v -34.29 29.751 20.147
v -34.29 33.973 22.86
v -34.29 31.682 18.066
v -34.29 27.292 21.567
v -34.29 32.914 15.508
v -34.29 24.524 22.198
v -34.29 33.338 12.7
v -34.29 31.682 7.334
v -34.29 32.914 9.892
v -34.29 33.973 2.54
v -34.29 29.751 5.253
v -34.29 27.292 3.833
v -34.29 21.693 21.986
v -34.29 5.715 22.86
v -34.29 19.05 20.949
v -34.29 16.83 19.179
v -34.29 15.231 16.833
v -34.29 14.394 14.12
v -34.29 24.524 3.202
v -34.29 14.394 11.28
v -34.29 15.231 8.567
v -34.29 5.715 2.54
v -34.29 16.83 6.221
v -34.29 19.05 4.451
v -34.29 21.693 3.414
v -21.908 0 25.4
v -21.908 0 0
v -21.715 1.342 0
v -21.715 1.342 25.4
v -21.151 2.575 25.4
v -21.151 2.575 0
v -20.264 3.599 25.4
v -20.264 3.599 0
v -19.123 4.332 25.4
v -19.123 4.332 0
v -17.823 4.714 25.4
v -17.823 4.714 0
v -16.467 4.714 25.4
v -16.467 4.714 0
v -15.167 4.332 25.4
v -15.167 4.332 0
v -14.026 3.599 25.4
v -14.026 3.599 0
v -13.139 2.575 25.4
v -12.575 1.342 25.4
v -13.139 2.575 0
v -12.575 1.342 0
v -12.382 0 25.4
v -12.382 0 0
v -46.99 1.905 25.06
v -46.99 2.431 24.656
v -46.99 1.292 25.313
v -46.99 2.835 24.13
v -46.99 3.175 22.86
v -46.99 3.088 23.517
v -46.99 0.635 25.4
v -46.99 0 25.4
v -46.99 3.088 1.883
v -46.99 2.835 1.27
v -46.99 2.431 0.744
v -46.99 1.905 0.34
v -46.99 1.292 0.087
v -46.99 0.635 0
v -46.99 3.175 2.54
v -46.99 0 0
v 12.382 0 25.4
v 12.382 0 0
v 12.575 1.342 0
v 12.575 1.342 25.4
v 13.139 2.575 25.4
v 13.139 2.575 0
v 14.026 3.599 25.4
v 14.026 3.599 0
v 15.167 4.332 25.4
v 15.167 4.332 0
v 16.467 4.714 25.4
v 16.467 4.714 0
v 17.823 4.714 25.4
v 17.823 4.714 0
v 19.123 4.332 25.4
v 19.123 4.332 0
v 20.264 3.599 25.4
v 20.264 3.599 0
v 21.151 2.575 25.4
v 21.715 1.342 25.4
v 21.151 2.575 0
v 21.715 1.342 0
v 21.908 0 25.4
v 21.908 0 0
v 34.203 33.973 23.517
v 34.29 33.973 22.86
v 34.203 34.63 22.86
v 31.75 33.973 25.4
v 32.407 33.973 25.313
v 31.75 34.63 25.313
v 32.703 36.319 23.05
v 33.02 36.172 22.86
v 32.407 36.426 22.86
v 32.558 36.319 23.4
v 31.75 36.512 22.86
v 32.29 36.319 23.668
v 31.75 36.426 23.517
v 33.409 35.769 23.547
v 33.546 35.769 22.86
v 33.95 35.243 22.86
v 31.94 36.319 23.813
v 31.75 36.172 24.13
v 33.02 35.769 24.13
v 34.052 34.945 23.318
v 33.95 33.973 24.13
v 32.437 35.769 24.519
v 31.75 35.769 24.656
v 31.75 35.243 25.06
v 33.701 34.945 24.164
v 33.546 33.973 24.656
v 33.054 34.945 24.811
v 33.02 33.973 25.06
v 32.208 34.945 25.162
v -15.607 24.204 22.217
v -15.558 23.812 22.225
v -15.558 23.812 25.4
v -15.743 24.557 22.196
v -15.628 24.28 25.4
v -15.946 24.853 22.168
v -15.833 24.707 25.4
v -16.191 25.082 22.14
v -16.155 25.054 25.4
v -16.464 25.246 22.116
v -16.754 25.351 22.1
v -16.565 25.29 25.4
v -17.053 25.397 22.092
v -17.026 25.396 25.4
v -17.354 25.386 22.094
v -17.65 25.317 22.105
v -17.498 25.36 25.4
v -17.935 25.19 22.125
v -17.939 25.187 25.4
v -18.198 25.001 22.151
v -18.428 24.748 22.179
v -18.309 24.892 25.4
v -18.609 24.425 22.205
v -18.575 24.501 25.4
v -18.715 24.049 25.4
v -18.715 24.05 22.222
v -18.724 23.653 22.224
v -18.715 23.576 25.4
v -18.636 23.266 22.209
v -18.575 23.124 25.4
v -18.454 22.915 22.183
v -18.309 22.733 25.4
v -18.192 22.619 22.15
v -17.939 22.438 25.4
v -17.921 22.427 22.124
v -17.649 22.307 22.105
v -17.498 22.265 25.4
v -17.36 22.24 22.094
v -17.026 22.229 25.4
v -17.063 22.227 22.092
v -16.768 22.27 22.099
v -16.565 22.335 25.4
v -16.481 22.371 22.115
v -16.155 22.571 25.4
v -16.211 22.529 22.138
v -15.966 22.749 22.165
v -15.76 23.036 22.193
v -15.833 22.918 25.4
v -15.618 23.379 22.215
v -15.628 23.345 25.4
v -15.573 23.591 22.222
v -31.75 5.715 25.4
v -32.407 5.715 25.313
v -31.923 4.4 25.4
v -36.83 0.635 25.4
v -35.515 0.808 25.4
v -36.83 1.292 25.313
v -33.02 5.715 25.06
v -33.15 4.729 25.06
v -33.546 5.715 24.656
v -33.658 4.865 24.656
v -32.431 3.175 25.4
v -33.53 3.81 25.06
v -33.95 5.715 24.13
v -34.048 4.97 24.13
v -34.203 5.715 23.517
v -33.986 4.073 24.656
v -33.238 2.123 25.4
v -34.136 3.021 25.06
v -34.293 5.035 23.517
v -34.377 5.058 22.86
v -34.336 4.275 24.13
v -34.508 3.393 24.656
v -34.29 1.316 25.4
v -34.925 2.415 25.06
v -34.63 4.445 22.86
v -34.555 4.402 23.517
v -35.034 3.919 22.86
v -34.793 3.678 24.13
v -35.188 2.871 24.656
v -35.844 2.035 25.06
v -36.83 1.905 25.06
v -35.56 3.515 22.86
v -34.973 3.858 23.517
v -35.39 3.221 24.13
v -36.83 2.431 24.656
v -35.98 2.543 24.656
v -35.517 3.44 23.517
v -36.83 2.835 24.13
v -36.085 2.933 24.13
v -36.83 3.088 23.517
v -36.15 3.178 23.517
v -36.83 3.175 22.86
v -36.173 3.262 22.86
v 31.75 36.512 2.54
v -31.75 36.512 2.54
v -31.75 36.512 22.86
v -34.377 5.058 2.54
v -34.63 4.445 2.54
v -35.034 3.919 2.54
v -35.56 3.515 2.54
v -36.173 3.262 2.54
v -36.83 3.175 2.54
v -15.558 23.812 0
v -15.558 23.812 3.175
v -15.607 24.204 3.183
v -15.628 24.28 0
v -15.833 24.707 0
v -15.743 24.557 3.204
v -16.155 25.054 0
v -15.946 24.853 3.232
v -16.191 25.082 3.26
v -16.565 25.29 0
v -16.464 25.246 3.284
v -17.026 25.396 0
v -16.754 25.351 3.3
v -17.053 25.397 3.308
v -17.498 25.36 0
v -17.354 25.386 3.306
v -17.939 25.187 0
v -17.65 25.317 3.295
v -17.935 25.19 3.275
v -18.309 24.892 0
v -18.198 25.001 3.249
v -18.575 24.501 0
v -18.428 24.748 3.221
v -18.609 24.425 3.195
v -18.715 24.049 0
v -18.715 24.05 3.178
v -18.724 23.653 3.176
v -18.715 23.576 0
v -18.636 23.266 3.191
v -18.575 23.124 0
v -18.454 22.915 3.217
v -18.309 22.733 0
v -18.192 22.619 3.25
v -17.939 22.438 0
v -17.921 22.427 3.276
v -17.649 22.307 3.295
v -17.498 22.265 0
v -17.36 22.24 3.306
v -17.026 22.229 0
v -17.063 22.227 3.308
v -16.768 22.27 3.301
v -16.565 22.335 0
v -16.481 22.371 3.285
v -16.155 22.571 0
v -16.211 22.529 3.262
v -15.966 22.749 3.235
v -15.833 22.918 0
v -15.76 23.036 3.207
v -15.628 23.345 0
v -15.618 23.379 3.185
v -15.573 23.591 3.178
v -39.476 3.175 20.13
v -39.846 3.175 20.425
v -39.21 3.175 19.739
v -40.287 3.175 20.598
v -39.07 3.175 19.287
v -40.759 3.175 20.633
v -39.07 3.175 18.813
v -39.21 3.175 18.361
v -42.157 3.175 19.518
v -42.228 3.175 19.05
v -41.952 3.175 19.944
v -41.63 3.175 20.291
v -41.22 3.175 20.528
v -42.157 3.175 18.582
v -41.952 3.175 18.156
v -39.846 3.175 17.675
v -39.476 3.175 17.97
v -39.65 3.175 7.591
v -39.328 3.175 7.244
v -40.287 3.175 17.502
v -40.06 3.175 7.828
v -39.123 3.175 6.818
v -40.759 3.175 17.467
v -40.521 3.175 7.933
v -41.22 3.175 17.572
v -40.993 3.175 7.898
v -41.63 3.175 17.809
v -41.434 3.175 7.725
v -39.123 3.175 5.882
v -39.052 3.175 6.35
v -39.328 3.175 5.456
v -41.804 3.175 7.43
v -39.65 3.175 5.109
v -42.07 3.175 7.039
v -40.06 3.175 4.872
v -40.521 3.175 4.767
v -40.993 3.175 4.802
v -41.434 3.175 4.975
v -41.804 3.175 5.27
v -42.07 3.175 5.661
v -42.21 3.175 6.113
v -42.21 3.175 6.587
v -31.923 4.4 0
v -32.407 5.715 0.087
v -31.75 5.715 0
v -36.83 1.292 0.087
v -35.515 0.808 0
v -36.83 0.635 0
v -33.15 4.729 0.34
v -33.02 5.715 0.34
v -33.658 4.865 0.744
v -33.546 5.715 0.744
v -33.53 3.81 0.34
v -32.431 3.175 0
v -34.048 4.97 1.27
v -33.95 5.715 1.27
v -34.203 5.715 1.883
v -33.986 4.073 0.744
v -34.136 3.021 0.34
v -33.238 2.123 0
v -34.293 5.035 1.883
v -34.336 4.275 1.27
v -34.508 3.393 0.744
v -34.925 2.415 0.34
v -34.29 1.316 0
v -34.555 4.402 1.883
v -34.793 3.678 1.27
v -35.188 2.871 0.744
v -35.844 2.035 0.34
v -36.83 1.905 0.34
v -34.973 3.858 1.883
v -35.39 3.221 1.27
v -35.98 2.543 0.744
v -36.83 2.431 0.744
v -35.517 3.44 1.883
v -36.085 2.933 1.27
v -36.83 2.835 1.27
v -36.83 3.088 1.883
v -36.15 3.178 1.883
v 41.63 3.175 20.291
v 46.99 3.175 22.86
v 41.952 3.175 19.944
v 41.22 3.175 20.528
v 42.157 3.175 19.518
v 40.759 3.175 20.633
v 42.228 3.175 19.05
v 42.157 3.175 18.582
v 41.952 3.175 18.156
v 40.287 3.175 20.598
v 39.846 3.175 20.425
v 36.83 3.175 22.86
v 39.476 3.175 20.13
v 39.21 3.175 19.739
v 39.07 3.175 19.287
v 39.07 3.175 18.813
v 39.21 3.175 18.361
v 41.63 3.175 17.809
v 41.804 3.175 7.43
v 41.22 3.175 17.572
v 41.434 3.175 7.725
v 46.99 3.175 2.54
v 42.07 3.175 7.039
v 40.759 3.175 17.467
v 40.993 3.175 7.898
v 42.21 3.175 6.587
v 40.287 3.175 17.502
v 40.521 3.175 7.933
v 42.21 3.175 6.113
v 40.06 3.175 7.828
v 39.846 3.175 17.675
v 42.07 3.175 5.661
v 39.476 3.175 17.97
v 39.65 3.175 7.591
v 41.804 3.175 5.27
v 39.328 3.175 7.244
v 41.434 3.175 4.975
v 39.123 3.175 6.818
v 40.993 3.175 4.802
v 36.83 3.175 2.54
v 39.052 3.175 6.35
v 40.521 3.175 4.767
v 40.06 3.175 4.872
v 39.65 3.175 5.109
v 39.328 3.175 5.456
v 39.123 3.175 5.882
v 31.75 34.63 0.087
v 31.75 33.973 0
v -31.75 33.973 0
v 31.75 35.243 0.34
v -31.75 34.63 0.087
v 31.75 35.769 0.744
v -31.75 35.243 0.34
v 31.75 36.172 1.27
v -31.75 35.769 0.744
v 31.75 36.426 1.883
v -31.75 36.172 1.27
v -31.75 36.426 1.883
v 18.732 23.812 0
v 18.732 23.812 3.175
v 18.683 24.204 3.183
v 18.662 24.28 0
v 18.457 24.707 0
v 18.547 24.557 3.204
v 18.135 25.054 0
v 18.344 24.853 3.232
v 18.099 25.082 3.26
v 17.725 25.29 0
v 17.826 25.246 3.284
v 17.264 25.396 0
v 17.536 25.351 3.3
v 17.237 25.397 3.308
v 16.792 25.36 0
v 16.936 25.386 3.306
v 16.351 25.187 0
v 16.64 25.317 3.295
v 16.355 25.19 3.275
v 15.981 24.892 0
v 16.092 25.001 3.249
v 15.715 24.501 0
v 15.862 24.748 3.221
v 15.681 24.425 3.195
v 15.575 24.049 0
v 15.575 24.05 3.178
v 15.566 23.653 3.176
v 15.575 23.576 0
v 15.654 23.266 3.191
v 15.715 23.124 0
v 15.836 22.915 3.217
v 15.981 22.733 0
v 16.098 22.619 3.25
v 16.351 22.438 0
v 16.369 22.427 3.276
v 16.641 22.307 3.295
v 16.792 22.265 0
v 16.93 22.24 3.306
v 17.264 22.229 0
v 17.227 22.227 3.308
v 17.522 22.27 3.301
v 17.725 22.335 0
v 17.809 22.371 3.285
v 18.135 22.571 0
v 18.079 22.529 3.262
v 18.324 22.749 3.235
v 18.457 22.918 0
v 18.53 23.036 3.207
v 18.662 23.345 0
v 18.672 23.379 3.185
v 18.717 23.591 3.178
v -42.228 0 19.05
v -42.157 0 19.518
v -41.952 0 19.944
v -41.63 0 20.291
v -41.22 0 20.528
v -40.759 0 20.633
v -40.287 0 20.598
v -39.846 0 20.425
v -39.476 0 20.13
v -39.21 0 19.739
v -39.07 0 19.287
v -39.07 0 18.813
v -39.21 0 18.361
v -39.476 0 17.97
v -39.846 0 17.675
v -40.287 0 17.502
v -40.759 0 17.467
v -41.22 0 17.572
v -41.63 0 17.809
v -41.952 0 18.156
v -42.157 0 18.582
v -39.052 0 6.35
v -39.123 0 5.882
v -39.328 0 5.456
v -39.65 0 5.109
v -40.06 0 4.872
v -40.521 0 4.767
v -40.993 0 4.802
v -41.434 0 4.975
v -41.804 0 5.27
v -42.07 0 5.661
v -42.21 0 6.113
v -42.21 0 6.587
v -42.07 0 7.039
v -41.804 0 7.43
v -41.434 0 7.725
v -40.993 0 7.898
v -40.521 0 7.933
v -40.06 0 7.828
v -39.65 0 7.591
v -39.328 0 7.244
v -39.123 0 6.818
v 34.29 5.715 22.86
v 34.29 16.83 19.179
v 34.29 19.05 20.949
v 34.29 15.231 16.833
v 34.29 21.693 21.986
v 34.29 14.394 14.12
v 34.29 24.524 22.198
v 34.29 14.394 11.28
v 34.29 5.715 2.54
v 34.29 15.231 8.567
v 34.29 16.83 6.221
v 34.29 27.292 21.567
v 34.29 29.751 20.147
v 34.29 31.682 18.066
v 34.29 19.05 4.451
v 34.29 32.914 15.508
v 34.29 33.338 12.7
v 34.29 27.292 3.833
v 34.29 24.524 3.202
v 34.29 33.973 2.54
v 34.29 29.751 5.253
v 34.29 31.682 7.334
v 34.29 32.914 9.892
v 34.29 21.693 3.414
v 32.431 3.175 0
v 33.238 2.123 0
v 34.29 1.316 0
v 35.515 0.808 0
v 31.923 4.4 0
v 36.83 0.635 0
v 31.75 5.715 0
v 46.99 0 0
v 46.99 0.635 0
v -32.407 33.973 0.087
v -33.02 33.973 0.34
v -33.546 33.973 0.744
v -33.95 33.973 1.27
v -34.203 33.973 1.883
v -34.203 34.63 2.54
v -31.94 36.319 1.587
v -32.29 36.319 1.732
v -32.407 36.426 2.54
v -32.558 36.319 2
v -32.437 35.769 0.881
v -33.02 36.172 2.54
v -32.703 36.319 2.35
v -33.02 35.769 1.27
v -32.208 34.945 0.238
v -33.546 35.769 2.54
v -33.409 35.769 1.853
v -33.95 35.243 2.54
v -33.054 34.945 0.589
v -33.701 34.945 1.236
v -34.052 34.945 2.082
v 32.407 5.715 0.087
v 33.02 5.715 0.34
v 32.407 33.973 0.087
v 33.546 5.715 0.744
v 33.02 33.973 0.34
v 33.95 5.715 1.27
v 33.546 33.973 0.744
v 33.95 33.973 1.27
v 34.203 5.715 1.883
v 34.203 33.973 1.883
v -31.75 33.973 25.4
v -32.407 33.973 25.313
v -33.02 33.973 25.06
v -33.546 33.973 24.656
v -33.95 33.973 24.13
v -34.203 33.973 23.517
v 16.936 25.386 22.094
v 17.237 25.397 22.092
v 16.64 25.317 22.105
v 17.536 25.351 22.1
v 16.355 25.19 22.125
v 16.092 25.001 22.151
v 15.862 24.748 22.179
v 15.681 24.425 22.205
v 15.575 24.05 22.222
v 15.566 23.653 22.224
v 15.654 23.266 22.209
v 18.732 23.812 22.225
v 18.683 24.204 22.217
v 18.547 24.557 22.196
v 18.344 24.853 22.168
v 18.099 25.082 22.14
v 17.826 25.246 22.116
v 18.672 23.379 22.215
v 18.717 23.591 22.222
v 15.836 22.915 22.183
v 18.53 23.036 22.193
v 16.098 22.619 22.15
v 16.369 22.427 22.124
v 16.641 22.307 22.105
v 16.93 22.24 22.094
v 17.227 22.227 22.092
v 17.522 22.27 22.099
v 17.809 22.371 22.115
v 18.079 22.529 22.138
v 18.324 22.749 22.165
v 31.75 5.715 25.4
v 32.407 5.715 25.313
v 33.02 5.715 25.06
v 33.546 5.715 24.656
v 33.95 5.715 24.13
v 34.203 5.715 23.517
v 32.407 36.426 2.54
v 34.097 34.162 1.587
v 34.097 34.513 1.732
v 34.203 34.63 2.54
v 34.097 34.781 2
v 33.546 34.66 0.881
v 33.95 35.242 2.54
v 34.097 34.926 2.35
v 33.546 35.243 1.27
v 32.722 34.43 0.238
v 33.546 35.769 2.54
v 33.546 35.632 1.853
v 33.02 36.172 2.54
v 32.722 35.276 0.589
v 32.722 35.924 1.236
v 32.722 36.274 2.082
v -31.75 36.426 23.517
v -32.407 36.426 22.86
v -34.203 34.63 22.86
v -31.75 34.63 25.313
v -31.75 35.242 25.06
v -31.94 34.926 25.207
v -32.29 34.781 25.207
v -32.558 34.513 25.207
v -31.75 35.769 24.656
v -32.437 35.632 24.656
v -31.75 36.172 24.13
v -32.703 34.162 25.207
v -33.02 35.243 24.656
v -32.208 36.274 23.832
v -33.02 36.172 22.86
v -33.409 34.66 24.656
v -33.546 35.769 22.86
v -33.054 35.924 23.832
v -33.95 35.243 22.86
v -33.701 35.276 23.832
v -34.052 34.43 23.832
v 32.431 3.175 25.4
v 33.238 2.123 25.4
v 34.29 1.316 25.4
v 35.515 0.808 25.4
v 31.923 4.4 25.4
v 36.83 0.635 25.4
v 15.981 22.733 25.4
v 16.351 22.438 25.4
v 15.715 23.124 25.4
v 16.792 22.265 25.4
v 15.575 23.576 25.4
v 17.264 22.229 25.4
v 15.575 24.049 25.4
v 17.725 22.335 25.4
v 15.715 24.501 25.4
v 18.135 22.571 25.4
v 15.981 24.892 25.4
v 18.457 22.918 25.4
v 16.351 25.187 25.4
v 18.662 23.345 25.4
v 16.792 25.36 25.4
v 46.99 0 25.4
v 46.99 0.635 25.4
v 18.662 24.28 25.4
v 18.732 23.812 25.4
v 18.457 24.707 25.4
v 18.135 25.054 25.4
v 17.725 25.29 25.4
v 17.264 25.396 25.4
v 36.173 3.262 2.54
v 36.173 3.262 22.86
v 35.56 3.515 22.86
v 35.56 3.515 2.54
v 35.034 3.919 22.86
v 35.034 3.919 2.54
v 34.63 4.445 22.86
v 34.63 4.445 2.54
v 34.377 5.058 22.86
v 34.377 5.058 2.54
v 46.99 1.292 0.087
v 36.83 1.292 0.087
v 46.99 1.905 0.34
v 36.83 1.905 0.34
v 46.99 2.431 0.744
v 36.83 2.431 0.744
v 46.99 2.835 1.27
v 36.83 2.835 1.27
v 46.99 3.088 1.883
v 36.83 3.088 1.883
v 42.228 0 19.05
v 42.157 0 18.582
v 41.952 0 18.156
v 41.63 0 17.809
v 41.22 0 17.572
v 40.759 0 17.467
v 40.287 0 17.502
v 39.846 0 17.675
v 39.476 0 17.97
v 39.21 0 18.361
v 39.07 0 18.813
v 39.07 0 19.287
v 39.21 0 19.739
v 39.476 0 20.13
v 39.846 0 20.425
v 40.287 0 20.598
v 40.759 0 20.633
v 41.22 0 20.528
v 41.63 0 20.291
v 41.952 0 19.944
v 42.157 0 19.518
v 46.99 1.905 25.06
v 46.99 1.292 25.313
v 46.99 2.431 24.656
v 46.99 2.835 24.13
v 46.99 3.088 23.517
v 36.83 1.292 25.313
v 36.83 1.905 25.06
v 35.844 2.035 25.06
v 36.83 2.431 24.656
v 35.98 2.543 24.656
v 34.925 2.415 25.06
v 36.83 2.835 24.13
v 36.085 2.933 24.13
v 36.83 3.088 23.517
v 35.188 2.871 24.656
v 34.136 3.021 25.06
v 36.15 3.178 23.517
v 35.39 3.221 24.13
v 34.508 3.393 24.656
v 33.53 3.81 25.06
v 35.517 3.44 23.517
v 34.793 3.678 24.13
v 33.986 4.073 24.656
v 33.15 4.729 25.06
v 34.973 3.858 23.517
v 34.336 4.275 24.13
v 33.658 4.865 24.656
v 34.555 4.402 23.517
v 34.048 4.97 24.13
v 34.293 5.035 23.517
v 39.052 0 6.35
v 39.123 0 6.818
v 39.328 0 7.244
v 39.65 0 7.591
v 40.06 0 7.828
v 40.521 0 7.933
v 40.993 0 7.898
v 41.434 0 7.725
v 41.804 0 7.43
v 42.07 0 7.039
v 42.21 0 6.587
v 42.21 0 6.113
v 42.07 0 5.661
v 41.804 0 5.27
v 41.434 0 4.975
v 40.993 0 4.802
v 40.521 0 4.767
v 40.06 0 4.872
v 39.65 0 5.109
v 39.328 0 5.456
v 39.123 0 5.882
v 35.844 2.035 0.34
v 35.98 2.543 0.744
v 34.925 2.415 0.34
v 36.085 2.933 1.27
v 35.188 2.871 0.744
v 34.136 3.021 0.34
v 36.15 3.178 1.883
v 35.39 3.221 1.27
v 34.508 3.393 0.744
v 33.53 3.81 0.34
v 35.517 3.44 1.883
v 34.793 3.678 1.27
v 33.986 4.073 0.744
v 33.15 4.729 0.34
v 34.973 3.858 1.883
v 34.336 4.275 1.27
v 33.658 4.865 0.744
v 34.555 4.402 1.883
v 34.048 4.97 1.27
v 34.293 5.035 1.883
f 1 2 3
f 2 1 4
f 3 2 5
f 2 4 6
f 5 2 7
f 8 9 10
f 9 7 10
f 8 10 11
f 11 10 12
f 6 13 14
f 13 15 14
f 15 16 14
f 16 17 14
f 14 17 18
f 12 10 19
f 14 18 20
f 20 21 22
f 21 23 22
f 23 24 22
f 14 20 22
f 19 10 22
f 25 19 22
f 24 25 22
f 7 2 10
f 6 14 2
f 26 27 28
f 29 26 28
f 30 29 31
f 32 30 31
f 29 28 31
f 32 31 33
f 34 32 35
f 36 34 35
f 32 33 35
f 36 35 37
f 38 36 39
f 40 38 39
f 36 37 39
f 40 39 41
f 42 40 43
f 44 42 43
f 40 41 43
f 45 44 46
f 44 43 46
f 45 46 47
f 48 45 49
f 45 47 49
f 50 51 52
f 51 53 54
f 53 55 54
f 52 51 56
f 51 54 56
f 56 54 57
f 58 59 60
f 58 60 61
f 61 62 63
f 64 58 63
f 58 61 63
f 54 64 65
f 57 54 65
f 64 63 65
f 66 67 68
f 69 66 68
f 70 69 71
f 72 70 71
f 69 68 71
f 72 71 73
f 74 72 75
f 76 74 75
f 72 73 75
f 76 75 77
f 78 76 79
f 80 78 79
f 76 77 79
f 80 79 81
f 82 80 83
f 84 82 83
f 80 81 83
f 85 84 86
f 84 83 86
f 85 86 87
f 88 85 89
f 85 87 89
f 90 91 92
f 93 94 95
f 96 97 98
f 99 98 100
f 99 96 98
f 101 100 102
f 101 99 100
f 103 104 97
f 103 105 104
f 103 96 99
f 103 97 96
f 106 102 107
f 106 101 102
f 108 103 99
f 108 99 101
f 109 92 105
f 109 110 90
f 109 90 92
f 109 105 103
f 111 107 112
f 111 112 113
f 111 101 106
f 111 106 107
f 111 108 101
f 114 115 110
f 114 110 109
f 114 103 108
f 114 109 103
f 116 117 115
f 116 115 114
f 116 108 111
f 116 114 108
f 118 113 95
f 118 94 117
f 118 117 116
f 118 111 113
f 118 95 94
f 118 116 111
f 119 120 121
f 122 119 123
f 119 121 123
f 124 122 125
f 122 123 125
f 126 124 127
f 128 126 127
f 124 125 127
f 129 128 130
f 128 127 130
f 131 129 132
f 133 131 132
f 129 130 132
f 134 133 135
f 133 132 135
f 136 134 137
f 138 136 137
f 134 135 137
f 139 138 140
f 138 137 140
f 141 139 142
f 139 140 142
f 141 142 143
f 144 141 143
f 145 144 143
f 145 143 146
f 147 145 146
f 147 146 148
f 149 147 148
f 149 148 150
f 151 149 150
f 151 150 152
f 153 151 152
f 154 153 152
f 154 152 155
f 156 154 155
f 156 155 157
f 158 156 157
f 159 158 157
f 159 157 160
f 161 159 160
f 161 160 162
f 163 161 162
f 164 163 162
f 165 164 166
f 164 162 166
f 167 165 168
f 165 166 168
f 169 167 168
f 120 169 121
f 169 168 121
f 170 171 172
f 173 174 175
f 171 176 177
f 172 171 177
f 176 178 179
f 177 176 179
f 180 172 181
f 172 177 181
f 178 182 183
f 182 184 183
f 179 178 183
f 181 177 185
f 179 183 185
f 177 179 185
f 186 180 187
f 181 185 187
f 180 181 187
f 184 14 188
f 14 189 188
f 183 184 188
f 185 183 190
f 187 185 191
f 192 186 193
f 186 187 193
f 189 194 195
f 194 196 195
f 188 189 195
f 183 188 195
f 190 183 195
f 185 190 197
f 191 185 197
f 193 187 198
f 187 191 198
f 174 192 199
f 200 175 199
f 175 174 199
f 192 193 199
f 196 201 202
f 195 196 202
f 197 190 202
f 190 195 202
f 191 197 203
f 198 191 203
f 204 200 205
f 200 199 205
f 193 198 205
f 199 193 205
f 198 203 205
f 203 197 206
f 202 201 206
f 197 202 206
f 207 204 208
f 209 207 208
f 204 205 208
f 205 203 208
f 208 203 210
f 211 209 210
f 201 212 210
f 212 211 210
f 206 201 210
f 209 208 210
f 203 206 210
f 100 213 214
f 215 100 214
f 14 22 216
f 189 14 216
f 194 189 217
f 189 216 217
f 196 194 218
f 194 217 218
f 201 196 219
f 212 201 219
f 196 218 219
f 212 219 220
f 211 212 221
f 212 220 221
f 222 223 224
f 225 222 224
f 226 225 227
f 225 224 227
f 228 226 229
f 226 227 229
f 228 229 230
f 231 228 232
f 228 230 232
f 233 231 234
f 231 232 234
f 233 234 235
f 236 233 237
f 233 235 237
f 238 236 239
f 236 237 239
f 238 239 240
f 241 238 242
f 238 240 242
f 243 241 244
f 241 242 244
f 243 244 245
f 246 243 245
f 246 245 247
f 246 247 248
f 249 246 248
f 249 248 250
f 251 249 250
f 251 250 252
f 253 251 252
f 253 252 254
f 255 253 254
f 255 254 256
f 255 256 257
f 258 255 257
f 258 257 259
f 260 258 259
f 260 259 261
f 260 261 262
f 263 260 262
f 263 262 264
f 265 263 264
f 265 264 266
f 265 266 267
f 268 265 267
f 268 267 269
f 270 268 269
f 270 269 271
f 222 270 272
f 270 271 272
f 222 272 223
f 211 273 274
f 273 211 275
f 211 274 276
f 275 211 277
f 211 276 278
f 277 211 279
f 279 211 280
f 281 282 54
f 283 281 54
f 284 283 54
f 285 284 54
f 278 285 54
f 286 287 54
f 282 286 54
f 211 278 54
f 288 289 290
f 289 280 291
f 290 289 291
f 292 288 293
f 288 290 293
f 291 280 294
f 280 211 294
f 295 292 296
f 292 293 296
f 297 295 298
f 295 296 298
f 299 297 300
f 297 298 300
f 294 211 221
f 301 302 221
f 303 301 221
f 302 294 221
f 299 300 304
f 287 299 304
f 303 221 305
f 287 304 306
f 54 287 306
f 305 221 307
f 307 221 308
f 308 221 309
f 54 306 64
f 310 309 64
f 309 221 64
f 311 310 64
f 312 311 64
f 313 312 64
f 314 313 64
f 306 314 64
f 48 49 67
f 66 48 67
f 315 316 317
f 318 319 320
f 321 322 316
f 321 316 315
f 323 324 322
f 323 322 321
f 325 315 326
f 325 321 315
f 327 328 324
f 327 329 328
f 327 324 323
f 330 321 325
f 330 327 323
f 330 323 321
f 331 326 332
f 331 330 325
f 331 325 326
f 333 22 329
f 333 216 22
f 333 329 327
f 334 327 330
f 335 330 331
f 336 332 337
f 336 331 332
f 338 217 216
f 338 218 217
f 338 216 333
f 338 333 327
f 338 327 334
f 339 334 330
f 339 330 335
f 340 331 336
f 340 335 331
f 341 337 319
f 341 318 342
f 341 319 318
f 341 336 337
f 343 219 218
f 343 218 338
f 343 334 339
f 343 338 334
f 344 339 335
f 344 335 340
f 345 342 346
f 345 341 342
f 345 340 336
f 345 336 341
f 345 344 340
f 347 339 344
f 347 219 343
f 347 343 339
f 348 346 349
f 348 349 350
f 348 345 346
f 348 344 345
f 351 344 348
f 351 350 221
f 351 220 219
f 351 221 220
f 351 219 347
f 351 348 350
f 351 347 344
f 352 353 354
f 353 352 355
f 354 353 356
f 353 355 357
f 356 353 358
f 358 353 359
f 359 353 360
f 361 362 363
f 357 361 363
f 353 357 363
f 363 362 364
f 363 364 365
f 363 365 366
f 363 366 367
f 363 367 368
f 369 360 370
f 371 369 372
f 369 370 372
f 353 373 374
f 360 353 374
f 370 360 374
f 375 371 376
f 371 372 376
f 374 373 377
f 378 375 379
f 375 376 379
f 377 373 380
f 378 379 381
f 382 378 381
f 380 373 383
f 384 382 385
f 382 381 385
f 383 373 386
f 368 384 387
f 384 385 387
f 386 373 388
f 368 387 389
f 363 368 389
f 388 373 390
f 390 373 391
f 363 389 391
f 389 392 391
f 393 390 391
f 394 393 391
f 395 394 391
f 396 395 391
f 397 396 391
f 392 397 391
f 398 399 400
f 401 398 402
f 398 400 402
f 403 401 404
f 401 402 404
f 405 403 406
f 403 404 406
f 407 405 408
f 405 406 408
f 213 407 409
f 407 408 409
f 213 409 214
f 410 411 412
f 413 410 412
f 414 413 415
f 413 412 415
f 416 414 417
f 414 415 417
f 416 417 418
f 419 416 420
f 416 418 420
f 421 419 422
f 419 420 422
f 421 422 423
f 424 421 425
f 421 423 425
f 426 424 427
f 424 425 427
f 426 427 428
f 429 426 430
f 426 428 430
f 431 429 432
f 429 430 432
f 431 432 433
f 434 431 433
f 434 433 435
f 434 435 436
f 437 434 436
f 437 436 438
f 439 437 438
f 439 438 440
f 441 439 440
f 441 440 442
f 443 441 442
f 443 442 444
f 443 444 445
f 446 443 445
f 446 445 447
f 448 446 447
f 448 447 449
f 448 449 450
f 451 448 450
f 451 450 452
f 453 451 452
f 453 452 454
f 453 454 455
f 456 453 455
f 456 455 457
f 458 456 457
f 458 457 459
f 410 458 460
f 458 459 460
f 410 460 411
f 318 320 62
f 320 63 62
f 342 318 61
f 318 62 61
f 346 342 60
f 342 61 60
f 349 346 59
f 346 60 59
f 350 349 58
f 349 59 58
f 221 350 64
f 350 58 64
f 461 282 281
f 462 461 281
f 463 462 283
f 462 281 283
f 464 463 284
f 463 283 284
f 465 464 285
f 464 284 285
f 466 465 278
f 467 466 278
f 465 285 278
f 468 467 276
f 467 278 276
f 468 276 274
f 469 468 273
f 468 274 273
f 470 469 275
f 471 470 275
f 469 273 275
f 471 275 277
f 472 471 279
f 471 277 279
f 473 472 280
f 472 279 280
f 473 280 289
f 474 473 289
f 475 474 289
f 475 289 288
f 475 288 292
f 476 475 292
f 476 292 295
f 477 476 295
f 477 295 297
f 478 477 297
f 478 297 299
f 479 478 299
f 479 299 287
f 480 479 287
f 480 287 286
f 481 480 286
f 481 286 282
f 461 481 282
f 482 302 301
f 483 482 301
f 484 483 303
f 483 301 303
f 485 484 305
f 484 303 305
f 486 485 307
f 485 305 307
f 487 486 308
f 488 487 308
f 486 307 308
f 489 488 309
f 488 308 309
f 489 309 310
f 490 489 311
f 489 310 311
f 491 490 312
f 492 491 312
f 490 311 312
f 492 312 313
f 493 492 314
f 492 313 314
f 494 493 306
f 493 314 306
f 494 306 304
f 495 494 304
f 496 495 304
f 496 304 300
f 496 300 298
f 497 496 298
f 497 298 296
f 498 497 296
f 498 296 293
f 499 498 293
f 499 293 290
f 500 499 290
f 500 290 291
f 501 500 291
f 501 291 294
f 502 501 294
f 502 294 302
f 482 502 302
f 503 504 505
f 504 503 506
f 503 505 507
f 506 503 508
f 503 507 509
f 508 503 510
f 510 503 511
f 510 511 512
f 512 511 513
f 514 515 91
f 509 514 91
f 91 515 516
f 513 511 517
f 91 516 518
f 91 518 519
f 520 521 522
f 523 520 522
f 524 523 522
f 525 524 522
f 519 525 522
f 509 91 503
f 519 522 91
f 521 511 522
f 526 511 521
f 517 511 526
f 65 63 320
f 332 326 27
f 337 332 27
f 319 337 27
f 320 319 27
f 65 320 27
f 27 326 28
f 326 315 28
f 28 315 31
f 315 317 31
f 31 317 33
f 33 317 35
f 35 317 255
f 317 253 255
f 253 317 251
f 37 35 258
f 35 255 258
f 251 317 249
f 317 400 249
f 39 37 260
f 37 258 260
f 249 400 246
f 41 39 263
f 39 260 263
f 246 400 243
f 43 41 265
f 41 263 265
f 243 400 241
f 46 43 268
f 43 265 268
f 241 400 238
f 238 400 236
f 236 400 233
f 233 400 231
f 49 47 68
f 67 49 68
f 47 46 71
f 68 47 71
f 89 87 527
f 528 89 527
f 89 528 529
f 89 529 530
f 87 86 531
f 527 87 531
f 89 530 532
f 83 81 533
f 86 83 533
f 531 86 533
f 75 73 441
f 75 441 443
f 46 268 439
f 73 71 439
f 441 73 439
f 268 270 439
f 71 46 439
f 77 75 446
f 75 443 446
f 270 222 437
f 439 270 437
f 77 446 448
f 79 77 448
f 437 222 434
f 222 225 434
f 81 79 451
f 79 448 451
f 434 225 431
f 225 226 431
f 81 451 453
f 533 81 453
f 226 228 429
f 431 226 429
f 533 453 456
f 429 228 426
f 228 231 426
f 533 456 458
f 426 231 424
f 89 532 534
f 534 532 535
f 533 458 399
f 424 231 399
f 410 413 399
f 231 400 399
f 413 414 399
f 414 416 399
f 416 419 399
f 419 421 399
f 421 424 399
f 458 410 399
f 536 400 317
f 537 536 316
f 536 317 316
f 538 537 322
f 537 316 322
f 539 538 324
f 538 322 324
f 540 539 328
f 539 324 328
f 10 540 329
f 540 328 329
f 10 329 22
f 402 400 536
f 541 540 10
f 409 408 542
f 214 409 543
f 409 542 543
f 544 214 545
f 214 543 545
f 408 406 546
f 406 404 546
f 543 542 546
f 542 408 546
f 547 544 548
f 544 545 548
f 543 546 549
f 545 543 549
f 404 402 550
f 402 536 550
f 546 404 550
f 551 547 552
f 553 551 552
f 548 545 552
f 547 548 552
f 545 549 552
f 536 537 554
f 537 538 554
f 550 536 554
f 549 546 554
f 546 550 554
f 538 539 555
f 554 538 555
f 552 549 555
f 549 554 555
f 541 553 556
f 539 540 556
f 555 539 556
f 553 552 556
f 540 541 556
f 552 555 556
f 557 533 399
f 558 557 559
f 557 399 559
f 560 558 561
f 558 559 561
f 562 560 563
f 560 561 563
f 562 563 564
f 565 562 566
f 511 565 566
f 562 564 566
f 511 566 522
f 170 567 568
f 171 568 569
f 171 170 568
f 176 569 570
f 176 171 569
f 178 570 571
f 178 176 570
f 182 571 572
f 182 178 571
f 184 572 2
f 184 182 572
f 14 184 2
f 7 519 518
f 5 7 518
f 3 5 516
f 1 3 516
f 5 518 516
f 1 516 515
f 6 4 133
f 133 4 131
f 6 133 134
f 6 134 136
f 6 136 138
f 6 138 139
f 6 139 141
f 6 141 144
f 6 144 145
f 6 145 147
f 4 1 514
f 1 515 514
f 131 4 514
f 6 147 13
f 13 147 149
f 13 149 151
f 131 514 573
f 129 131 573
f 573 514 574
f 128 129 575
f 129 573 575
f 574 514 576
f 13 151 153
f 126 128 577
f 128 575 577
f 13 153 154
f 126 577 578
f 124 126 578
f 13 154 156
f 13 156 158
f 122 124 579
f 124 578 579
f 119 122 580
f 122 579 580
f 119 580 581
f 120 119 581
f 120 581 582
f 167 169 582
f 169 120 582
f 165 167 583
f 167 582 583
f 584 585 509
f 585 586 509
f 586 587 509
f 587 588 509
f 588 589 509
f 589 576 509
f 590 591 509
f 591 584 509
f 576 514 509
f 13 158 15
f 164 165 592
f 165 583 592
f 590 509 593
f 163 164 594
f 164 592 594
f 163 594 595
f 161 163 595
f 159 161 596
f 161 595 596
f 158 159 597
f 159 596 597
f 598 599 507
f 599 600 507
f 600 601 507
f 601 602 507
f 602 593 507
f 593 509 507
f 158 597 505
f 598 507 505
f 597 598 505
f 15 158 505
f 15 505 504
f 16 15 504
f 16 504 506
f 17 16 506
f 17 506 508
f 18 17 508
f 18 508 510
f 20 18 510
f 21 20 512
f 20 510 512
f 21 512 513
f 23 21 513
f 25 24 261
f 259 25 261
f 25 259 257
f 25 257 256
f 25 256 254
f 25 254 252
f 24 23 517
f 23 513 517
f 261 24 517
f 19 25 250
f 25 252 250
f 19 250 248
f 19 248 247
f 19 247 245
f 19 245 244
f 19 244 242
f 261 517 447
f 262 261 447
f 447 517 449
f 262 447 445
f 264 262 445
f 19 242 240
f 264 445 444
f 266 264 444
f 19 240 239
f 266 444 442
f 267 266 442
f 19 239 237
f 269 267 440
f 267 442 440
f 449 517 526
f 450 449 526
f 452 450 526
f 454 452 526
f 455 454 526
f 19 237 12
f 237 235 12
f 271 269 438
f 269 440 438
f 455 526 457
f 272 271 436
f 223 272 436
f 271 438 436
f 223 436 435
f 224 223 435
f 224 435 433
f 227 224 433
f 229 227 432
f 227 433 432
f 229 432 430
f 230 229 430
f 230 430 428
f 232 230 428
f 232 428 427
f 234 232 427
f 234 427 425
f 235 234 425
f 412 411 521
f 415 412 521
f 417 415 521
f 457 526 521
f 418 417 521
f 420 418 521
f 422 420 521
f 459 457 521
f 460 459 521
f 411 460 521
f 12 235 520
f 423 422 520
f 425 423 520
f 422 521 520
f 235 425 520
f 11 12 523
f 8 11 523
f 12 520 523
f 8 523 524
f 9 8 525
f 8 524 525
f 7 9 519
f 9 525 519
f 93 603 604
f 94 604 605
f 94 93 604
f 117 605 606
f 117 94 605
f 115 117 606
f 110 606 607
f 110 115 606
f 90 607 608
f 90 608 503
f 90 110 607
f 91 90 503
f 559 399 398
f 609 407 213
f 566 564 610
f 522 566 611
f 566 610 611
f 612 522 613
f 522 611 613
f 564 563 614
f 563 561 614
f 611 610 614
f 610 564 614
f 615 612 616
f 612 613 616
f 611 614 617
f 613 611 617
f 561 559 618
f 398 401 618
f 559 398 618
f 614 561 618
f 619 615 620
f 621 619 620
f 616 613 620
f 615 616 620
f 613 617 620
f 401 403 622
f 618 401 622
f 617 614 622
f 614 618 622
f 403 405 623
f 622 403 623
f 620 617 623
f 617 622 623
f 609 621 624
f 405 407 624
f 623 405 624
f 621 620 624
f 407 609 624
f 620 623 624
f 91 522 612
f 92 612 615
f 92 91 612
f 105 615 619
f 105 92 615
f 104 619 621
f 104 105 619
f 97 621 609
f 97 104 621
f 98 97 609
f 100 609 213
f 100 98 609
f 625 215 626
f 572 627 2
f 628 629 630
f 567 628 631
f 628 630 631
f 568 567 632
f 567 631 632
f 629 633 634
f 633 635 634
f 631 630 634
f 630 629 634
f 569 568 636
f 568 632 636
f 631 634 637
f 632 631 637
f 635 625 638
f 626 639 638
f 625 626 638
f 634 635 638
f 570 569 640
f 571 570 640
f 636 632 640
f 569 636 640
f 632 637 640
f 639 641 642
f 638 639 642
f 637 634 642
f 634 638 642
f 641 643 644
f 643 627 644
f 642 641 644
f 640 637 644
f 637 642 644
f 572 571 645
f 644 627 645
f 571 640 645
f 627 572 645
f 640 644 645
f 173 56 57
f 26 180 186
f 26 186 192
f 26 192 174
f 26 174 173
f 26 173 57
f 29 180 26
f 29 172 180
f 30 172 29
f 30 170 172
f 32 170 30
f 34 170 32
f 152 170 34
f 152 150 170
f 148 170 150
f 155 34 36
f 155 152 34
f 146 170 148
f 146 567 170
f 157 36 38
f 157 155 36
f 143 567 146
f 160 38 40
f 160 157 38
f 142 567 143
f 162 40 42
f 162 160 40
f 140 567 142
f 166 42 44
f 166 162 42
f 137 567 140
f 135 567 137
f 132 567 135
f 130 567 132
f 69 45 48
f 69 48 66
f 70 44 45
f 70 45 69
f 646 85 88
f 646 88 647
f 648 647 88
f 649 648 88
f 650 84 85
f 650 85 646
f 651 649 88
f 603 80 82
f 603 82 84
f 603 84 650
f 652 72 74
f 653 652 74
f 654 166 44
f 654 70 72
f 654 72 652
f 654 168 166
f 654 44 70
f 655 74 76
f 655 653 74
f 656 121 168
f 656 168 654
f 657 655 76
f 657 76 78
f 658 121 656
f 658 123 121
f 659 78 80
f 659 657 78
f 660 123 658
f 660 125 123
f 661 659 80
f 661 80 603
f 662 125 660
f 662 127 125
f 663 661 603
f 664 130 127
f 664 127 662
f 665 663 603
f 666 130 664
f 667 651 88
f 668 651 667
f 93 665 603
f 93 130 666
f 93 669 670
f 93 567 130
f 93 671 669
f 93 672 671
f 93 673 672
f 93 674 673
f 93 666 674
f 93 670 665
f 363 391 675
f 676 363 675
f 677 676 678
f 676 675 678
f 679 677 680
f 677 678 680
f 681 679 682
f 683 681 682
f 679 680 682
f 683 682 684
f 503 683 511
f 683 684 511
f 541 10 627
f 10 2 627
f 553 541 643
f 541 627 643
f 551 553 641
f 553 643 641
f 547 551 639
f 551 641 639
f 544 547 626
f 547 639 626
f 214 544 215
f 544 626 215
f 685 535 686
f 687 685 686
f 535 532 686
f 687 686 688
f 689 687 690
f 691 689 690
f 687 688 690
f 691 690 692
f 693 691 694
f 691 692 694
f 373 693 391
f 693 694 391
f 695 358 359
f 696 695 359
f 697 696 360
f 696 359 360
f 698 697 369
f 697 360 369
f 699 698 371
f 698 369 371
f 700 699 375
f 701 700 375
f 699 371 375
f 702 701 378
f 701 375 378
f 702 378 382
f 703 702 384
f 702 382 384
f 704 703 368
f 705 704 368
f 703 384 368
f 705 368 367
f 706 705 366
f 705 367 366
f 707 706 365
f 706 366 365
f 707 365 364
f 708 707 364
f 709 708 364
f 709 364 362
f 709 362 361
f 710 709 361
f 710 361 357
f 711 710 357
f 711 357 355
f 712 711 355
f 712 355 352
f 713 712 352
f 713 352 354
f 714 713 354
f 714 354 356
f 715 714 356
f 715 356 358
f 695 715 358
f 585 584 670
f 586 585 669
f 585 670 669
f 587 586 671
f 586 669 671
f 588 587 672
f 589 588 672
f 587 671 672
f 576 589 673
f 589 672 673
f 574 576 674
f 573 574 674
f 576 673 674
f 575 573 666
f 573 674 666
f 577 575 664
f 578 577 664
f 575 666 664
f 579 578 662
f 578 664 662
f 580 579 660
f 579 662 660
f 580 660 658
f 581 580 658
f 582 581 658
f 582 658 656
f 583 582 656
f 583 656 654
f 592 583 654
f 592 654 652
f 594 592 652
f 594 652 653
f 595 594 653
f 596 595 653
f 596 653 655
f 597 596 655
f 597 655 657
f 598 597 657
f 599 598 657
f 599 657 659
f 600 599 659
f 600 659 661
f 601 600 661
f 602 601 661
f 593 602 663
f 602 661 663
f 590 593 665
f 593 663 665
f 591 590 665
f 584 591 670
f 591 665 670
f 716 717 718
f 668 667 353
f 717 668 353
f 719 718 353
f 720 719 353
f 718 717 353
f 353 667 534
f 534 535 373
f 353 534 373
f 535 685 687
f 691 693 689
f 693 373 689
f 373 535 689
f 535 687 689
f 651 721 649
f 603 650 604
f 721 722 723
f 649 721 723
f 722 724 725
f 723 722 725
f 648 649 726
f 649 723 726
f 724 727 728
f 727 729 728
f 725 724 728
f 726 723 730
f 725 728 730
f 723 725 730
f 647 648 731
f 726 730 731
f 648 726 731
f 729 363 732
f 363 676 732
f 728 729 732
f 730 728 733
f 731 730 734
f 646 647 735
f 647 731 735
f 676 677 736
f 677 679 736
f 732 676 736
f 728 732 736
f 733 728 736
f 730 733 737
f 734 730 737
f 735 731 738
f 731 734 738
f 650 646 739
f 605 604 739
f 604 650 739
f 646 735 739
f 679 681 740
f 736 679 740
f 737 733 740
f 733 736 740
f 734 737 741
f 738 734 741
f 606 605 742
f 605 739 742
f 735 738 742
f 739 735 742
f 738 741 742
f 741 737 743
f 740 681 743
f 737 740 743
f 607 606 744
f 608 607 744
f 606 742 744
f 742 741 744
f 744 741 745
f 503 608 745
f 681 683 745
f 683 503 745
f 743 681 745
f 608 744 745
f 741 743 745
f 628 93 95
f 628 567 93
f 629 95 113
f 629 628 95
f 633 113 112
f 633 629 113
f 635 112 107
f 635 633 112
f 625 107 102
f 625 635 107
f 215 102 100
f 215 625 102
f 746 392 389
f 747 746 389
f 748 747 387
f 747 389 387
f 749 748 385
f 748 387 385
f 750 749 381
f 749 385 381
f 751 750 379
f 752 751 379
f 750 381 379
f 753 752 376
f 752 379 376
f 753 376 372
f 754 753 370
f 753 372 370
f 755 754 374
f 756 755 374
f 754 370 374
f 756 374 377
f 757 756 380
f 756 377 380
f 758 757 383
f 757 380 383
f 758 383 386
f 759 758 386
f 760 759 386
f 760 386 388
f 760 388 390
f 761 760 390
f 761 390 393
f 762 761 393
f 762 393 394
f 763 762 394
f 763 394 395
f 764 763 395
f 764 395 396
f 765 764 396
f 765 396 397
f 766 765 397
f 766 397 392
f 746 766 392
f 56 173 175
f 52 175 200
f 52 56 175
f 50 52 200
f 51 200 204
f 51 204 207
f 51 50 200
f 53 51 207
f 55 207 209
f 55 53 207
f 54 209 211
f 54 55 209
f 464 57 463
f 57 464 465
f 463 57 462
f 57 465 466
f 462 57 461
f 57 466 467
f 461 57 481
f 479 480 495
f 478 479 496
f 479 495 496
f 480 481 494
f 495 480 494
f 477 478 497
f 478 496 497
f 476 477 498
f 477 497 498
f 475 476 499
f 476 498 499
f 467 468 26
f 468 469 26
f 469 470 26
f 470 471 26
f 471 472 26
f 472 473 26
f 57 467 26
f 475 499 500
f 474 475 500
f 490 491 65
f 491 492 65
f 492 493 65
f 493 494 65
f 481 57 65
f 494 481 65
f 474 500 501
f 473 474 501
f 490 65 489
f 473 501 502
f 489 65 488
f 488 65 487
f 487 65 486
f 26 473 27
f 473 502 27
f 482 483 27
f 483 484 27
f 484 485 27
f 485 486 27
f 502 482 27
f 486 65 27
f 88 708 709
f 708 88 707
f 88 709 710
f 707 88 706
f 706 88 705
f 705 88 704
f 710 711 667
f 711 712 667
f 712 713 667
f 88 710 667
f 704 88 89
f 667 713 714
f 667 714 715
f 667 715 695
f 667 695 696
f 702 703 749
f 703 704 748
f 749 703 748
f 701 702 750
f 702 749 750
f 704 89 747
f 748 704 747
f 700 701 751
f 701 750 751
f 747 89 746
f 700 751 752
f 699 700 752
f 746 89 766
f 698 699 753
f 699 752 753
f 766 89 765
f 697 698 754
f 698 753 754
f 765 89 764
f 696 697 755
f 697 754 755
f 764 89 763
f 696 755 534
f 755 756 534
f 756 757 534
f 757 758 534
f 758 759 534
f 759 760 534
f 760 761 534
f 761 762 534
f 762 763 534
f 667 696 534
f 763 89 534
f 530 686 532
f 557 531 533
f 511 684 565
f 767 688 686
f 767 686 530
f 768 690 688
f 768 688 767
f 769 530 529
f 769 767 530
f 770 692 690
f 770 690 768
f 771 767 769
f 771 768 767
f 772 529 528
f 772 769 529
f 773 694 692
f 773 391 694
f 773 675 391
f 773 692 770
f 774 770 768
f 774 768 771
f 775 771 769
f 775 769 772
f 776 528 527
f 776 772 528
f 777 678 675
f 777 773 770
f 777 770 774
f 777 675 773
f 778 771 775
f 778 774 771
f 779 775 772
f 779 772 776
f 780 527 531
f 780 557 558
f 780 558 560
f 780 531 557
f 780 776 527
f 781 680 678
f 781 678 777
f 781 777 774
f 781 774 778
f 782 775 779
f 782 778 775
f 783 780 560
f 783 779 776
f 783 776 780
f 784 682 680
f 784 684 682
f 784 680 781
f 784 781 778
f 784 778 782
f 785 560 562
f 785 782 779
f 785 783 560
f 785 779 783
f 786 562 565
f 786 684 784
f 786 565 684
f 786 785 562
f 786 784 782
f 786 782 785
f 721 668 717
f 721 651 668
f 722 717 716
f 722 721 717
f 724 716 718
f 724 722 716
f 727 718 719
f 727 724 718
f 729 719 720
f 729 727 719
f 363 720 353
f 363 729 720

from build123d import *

# Parameters (mm, degrees)
BOSS_EXTRUDE1_DEPTH = 25.4
SKETCH2_R           = 1.5875
CUT_EXTRUDE1_DEPTH  = 63.965141199
SKETCH3_R           = 9.525
CUT_EXTRUDE2_DEPTH  = 93.653985647
SKETCH4_R           = 1.5875
CUT_EXTRUDE3_DEPTH  = 65.702262374
FILLET1_R           = 2.54


with BuildPart() as part:
    # Sketch1 → Boss-Extrude1 (new body)
    with BuildSketch(Plane.XY):
        with BuildLine():
            Line((-12.3825, 0), (12.3825, 0))
            ThreePointArc((12.3825, 0), (17.145, 4.7625), (21.9075, 0))
            Line((21.9075, 0), (46.99, 0))
            Line((46.99, 0), (46.99, 3.175))
            Line((46.99, 3.175), (36.83, 3.175))
            ThreePointArc((36.83, 3.175), (35.033948776, 3.918948776), (34.29, 5.715))
            Line((34.29, 5.715), (34.29, 36.5125))
            Line((34.29, 36.5125), (-34.29, 36.5125))
            Line((-34.29, 36.5125), (-34.29, 5.715))
            ThreePointArc((-34.29, 5.715), (-35.033948776, 3.918948776), (-36.83, 3.175))
            Line((-36.83, 3.175), (-46.99, 3.175))
            Line((-46.99, 3.175), (-46.99, 0))
            Line((-46.99, 0), (-21.9075, 0))
            ThreePointArc((-21.9075, 0), (-17.145, 4.7625), (-12.3825, 0))
        make_face()
    extrude(amount=BOSS_EXTRUDE1_DEPTH)

    # Sketch2 → Cut-Extrude1 (cut, through all)
    with BuildSketch(Plane(origin=(0, 3.175, 0), x_dir=(1, 0, 0), z_dir=(0, 1, 0))):
        with Locations(Location((40.64, -6.35, 0), (0, 0, 180))):
            Circle(SKETCH2_R)
        with Locations((40.64, -19.05)):
            Circle(SKETCH2_R)
        with Locations((-40.64, -6.35)):
            Circle(SKETCH2_R)
        with Locations(Location((-40.64, -19.05, 0), (0, 0, 180))):
            Circle(SKETCH2_R)
    extrude(amount=-CUT_EXTRUDE1_DEPTH, mode=Mode.SUBTRACT)

    # Sketch3 → Cut-Extrude2 (cut, through all)
    with BuildSketch(Plane(origin=(34.29, 0, 0), x_dir=(0, 0, -1), z_dir=(1, 0, 0))):
        with Locations(Location((-12.7, 23.8125, 0), (0, 0, 90))):
            Circle(SKETCH3_R)
    extrude(amount=-CUT_EXTRUDE2_DEPTH, mode=Mode.SUBTRACT)

    # Sketch4 → Cut-Extrude3 (cut, through all)
    with BuildSketch(Plane.XY.offset(25.4)):
        with Locations((17.145, 23.8125)):
            Circle(SKETCH4_R)
        with Locations((-17.145, 23.8125)):
            Circle(SKETCH4_R)
    extrude(amount=-CUT_EXTRUDE3_DEPTH, mode=Mode.SUBTRACT)

    # Fillet1
    fillet1_edges = [part.edges().sort_by_distance(p)[0] for p in [
        (-41.91, 3.175, 0),
        (-35.033948776, 3.918948776, 0),
        (-34.29, 21.11375, 0),
        (0, 36.5125, 0),
        (41.91, 3.175, 25.4),
        (34.29, 21.11375, 0),
        (35.033948776, 3.918948776, 0),
        (41.91, 3.175, 0),
        (35.033948776, 3.918948776, 25.4),
        (-34.29, 36.5125, 12.7),
        (34.29, 36.5125, 12.7),
        (34.29, 21.11375, 25.4),
        (0, 36.5125, 25.4),
        (-34.29, 21.11375, 25.4),
        (-35.033948776, 3.918948776, 25.4),
        (-41.91, 3.175, 25.4),
    ]]
    fillet(fillet1_edges, radius=FILLET1_R)


solid = part.part
